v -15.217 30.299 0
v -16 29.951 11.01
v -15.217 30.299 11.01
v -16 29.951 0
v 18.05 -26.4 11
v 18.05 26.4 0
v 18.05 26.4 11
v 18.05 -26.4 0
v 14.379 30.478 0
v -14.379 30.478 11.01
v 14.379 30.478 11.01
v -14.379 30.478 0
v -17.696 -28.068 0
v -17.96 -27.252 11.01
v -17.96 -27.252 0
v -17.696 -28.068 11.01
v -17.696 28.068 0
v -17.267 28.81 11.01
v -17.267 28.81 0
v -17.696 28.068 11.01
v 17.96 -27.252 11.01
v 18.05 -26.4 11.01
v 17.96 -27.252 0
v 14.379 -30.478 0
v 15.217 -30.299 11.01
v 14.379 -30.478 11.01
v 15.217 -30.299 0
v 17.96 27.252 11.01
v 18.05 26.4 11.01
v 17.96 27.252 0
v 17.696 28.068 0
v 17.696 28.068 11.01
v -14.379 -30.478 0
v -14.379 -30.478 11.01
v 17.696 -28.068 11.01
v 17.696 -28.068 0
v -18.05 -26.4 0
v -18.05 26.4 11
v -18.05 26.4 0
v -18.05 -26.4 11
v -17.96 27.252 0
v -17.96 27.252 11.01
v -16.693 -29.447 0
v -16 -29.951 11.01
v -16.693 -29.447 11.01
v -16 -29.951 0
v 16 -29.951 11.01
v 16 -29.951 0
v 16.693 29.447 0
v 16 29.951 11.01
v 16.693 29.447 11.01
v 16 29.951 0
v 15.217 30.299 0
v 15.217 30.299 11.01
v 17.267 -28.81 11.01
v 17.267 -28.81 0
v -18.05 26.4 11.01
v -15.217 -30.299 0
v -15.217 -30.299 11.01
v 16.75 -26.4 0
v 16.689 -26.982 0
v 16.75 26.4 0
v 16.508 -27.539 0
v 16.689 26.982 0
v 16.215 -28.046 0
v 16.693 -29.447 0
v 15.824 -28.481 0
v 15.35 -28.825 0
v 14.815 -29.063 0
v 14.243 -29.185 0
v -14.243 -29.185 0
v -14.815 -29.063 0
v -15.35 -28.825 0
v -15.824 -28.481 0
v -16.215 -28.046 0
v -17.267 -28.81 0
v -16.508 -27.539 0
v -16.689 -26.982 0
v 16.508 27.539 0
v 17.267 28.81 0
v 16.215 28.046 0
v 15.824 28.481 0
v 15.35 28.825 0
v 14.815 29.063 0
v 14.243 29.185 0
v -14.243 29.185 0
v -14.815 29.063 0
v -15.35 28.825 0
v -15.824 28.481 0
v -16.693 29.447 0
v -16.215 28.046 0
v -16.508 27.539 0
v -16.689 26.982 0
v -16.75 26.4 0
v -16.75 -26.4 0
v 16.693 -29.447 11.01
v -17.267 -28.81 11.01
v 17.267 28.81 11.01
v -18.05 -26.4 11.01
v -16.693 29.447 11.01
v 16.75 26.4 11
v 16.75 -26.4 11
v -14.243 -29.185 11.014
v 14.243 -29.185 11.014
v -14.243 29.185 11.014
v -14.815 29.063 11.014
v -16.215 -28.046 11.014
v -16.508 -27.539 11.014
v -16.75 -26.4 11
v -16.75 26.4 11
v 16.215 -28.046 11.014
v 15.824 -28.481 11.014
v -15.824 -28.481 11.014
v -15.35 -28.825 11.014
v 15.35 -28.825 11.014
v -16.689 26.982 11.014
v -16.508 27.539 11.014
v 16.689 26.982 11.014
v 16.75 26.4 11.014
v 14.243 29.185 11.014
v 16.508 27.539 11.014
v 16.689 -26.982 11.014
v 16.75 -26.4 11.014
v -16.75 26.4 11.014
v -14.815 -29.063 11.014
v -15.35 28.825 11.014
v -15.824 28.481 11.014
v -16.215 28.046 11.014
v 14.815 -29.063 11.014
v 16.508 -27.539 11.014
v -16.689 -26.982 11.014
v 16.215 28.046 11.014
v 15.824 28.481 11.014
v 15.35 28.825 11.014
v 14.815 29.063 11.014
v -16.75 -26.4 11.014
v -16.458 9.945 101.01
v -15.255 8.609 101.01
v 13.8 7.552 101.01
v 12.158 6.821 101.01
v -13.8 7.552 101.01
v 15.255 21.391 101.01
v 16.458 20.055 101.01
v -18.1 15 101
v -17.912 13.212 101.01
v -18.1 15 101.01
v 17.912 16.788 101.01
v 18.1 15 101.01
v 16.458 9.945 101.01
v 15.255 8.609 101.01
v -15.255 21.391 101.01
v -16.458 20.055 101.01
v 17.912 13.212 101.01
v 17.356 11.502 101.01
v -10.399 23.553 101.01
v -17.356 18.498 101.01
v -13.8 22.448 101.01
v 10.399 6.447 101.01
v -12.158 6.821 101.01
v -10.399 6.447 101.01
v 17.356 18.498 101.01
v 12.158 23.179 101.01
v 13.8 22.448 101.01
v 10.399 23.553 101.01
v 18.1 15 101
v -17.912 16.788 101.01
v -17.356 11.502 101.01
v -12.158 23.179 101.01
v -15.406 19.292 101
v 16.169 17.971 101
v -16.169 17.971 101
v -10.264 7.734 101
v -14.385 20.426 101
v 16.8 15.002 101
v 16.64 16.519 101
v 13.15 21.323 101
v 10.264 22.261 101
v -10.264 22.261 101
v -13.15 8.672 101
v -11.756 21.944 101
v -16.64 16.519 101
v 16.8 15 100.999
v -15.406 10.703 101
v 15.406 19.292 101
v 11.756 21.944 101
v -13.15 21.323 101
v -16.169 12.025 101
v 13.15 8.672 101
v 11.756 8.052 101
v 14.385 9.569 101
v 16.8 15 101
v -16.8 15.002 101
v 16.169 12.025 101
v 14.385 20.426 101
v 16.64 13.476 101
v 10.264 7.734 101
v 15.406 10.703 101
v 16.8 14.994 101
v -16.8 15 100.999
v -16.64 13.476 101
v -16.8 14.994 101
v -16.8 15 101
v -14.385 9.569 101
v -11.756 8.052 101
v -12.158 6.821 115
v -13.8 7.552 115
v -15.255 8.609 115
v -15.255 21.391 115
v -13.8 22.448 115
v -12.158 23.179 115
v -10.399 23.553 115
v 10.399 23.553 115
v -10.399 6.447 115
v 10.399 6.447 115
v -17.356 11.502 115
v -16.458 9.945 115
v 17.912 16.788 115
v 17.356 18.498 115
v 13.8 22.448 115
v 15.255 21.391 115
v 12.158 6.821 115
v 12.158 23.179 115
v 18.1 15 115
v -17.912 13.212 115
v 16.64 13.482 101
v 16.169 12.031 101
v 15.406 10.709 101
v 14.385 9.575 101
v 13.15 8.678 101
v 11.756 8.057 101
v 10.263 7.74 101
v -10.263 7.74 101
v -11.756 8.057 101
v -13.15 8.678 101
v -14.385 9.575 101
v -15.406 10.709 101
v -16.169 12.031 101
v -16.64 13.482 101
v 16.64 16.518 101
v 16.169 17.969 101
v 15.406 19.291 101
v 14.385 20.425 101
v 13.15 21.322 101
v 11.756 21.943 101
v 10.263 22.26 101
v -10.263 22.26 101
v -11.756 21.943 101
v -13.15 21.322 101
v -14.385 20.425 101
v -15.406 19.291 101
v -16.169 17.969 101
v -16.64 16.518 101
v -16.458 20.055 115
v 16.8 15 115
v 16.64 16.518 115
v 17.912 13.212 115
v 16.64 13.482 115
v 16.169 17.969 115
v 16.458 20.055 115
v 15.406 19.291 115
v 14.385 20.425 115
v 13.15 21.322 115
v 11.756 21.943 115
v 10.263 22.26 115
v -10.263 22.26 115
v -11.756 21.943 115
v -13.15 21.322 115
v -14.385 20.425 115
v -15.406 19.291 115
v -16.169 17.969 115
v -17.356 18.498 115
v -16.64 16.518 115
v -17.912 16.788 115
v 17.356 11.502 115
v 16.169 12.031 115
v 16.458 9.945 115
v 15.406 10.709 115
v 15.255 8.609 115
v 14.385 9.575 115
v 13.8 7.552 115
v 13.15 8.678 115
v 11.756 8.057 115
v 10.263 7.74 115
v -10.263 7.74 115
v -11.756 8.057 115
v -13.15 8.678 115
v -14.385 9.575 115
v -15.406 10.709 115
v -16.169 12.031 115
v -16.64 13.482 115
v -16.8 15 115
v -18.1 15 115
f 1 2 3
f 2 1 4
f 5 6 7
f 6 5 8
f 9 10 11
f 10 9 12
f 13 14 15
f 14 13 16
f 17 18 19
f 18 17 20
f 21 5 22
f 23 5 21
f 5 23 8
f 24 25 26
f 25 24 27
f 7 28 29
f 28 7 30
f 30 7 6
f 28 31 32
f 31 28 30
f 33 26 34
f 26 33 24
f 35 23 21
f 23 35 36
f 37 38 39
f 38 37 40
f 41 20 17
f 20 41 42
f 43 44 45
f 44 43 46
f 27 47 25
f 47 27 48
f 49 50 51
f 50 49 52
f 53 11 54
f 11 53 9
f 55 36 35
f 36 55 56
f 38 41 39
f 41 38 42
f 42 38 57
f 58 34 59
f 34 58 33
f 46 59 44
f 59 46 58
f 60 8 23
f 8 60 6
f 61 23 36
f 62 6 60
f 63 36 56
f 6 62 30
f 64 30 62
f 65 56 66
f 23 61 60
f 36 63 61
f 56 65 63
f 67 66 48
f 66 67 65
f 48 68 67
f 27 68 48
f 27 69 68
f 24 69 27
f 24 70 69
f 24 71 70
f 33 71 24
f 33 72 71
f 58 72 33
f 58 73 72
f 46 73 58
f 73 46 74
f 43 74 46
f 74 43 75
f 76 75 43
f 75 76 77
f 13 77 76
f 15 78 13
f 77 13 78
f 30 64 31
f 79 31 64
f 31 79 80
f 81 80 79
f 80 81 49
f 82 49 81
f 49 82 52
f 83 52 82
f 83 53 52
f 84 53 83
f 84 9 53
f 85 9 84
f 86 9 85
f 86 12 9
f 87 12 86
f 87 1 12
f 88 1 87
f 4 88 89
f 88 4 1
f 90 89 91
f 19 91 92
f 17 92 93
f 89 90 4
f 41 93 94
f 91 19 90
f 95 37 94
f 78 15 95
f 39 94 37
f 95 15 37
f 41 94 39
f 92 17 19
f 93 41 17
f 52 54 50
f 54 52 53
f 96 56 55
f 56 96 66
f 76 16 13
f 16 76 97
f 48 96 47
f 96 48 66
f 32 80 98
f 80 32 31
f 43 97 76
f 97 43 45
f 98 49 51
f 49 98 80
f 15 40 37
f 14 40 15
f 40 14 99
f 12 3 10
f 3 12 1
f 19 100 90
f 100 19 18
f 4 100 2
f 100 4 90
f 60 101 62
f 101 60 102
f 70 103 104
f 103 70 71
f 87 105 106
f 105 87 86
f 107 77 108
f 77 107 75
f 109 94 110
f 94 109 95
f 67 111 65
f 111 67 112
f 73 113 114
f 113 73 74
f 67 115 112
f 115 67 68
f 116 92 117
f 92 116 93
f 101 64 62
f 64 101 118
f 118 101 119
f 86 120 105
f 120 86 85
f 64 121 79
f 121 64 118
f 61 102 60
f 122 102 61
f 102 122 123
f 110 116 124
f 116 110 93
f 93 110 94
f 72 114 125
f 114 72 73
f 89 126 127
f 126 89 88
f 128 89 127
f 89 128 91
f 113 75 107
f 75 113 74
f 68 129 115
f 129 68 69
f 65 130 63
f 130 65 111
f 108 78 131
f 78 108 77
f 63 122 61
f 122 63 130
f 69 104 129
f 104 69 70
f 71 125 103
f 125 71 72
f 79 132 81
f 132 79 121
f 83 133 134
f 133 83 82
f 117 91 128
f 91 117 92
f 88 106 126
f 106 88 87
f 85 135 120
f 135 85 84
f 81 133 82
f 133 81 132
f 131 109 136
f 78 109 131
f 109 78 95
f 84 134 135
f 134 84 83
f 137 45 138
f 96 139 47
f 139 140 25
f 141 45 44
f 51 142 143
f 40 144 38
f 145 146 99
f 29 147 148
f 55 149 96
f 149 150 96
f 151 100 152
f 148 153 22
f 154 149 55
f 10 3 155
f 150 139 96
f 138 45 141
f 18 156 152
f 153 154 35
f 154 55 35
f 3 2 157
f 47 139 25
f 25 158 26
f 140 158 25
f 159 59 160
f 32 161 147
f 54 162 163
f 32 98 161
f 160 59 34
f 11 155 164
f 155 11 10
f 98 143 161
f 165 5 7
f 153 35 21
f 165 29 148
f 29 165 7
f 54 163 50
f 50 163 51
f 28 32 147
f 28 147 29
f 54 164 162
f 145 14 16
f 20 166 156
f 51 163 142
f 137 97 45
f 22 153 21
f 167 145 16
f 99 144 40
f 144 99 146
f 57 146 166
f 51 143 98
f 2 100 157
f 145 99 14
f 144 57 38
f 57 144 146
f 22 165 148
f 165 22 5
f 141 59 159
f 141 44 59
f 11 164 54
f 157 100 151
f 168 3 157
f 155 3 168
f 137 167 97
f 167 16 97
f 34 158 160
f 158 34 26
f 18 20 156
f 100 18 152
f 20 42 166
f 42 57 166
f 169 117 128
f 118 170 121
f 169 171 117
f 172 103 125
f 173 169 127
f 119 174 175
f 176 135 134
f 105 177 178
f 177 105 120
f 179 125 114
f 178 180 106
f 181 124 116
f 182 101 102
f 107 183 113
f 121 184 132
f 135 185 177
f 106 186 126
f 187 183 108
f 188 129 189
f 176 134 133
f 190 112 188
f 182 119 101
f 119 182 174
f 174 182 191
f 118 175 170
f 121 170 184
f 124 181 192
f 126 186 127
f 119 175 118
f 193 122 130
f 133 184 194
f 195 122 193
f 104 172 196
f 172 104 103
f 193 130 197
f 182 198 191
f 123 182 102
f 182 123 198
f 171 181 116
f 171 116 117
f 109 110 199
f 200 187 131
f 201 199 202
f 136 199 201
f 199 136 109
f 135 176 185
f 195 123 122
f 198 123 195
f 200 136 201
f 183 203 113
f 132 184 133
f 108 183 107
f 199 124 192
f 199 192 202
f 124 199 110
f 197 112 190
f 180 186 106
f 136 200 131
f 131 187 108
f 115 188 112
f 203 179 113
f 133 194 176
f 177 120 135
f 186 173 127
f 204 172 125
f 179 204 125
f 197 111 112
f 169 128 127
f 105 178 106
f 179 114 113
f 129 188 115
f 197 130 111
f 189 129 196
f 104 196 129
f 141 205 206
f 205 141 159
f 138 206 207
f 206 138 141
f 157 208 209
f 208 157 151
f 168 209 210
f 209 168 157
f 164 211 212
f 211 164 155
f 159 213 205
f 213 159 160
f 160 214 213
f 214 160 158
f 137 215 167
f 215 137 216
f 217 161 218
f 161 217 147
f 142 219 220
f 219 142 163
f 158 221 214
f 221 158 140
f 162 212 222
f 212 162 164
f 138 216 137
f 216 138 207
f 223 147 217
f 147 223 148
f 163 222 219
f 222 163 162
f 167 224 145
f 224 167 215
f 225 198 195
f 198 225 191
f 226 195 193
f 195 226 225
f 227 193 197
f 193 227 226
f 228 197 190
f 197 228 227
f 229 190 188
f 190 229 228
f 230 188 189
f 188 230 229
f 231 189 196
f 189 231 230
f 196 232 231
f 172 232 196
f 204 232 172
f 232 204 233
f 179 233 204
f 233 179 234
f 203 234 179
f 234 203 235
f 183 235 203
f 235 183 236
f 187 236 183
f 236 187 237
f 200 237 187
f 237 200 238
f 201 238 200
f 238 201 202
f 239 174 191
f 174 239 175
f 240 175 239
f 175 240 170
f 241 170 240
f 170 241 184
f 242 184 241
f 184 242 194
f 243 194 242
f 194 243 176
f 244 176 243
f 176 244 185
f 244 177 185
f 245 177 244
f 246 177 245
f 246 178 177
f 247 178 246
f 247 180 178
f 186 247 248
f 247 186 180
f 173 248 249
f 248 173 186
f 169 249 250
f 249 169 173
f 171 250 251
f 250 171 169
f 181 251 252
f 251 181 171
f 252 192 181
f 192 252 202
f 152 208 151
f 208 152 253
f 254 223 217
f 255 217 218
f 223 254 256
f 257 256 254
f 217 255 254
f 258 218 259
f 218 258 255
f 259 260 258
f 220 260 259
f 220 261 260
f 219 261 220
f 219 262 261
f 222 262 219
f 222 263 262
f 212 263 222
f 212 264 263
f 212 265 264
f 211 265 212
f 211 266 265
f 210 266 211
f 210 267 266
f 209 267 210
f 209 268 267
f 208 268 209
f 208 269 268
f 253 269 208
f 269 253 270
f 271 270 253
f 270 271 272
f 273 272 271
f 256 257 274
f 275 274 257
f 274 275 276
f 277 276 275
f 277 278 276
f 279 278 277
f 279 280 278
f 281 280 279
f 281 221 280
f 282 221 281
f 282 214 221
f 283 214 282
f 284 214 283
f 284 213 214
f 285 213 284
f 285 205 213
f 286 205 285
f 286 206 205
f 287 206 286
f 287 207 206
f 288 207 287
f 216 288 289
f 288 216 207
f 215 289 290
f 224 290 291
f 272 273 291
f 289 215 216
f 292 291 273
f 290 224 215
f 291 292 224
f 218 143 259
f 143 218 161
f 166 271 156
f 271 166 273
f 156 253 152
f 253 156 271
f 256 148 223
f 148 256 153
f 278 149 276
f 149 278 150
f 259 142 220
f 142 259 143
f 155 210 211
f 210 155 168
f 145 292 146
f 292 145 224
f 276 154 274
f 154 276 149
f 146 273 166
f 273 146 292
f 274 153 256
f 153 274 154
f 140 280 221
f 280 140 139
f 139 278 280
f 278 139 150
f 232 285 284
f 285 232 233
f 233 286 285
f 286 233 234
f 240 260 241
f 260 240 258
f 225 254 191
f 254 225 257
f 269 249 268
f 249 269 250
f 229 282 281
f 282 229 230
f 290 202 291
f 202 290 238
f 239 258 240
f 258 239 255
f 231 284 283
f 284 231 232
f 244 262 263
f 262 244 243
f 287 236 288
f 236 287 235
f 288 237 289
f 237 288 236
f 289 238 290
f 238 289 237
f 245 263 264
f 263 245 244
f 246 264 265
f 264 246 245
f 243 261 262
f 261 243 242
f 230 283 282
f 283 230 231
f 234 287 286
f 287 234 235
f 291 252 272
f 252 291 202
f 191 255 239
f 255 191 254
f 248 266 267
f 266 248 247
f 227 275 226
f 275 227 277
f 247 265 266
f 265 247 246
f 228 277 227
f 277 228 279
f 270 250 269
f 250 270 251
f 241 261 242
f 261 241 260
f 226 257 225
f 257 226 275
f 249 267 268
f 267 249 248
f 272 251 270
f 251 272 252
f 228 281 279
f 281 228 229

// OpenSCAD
////----BlowerTip.scad----
////----OpenSCAD 2015.03-2----
////----2018.7.12----
////----By Kijja Chaovanakij----
////Base's parameters refer to Delta dc brushless fan model BFB1012H
////----2018.7.20----
////----revise translation var

/* [var] */
//number of fragments[30=low:40=medium:60=high]
$fn=30;
//view angle
$vpr=[65,0,75];

/* [base var] */
//fit tolerance between base and blower fan[0.3]
fit_tol=0.3;
//inner base or outer object x size[32.9]
base_xsize=32.9;
//inner base or outer object y size[57.8]
base_ysize=57.8;
//inner base or outer object z overlap[11]
base_zsize=11;
//inner base or outer object corner radius[2.5]
base_rad=2.5;

/* [tip var] */
//tip thickness[1.6]
tip_thk=1.6;
//inner tip x size[32]
tip_xsize=24;
//inner tip y size[12]
tip_ysize=12;
//inner tip radius[7]
tip_rad=7;
//tip z size[14]
tip_zsize=14;
//tip y offset from center of the fan's discharge port [0-100]
tip_yoffset=15;
//tip type[1=rectangular:2=slot:other number=round]
tip_type=2;
//rotate tip[1=verical:other number=horizontal]
tip_rotate=0;
//chamfered length between base and tip. It should be almost twice of the fan's bigger base size.[115.6]
cham_zsize=90;

////----translate var----
bxc2c=base_xsize-base_rad*2;
byc2c=base_ysize-base_rad*2;
txc2c=tip_xsize-base_rad*2;
tyc2c=tip_ysize-base_rad*2;

////----main----
hollow_base();
translate([0,0,base_zsize])
  hollow_chamfer();
translate([0,tip_yoffset,base_zsize+cham_zsize])
  hollow_tip(tip_zsize);
//

module hollow_base(){
  difference(){
    tetra_round_box(bxc2c,byc2c,base_zsize,base_rad+tip_thk);

    translate([0,0,-0.001])
    tetra_round_box(bxc2c,byc2c,base_zsize+0.005,base_rad+fit_tol);
  }
}
//

module hollow_chamfer(){
  color("Orange")
  difference(){
    hull(){
      tetra_round_box(bxc2c,byc2c,0.01,base_rad+tip_thk);

      translate([0,tip_yoffset,cham_zsize])
      if (tip_rotate==1)
        rotate([0,0,90])
        outer_tip(0.01);
      else
        outer_tip(0.01);
    }

    hull(){
      translate([0,0,-0.001])
      tetra_round_box(bxc2c,byc2c,0.015,base_rad+fit_tol);

      translate([0,tip_yoffset,cham_zsize-0.001])
      if (tip_rotate==1)
        rotate([0,0,90])
        inner_tip(0.015);
      else
        inner_tip(0.015);
    }
  }
}
//

module hollow_tip(tip_zsize){
  if (tip_rotate==1)
    rotate([0,0,90])
    difference(){
      outer_tip(tip_zsize);
      translate([0,0,-0.001])
      inner_tip(tip_zsize+0.005);
    }
  else
    difference(){
      outer_tip(tip_zsize);
      translate([0,0,-0.001])
      inner_tip(tip_zsize+0.005);
    }
}
//

module outer_tip(tip_zsize){
  if (tip_type==1)
    tetra_round_box(txc2c,tyc2c,tip_zsize,base_rad+tip_thk);
    
  else if (tip_type==2)
    dual_round_box(txc2c,tip_zsize,tip_rad+tip_thk);

  else
     cylinder(tip_zsize,tip_rad+tip_thk,tip_rad+tip_thk);
}
//

module inner_tip(tip_zsize){
  if (tip_type==1)
    tetra_round_box(txc2c,tyc2c,tip_zsize,base_rad+fit_tol);
    
  else if (tip_type==2)
    dual_round_box(txc2c,tip_zsize,tip_rad+fit_tol);

  else
     cylinder(tip_zsize,tip_rad+fit_tol,tip_rad+fit_tol);
}
//

module tetra_round_box(xsize,ysize,height,rounding){
  hull(){
    for (i=[-xsize/2,xsize/2])
      for (j=[-ysize/2,ysize/2])
        translate([i,j,0])
        cylinder(height,rounding,rounding);
  }
}
//

module dual_round_box(xsize,height,rounding){
  hull(){
    for (i=[-xsize/2,xsize/2])
      translate([i,0,0])
      cylinder(height,rounding,rounding);
  }
}
//
